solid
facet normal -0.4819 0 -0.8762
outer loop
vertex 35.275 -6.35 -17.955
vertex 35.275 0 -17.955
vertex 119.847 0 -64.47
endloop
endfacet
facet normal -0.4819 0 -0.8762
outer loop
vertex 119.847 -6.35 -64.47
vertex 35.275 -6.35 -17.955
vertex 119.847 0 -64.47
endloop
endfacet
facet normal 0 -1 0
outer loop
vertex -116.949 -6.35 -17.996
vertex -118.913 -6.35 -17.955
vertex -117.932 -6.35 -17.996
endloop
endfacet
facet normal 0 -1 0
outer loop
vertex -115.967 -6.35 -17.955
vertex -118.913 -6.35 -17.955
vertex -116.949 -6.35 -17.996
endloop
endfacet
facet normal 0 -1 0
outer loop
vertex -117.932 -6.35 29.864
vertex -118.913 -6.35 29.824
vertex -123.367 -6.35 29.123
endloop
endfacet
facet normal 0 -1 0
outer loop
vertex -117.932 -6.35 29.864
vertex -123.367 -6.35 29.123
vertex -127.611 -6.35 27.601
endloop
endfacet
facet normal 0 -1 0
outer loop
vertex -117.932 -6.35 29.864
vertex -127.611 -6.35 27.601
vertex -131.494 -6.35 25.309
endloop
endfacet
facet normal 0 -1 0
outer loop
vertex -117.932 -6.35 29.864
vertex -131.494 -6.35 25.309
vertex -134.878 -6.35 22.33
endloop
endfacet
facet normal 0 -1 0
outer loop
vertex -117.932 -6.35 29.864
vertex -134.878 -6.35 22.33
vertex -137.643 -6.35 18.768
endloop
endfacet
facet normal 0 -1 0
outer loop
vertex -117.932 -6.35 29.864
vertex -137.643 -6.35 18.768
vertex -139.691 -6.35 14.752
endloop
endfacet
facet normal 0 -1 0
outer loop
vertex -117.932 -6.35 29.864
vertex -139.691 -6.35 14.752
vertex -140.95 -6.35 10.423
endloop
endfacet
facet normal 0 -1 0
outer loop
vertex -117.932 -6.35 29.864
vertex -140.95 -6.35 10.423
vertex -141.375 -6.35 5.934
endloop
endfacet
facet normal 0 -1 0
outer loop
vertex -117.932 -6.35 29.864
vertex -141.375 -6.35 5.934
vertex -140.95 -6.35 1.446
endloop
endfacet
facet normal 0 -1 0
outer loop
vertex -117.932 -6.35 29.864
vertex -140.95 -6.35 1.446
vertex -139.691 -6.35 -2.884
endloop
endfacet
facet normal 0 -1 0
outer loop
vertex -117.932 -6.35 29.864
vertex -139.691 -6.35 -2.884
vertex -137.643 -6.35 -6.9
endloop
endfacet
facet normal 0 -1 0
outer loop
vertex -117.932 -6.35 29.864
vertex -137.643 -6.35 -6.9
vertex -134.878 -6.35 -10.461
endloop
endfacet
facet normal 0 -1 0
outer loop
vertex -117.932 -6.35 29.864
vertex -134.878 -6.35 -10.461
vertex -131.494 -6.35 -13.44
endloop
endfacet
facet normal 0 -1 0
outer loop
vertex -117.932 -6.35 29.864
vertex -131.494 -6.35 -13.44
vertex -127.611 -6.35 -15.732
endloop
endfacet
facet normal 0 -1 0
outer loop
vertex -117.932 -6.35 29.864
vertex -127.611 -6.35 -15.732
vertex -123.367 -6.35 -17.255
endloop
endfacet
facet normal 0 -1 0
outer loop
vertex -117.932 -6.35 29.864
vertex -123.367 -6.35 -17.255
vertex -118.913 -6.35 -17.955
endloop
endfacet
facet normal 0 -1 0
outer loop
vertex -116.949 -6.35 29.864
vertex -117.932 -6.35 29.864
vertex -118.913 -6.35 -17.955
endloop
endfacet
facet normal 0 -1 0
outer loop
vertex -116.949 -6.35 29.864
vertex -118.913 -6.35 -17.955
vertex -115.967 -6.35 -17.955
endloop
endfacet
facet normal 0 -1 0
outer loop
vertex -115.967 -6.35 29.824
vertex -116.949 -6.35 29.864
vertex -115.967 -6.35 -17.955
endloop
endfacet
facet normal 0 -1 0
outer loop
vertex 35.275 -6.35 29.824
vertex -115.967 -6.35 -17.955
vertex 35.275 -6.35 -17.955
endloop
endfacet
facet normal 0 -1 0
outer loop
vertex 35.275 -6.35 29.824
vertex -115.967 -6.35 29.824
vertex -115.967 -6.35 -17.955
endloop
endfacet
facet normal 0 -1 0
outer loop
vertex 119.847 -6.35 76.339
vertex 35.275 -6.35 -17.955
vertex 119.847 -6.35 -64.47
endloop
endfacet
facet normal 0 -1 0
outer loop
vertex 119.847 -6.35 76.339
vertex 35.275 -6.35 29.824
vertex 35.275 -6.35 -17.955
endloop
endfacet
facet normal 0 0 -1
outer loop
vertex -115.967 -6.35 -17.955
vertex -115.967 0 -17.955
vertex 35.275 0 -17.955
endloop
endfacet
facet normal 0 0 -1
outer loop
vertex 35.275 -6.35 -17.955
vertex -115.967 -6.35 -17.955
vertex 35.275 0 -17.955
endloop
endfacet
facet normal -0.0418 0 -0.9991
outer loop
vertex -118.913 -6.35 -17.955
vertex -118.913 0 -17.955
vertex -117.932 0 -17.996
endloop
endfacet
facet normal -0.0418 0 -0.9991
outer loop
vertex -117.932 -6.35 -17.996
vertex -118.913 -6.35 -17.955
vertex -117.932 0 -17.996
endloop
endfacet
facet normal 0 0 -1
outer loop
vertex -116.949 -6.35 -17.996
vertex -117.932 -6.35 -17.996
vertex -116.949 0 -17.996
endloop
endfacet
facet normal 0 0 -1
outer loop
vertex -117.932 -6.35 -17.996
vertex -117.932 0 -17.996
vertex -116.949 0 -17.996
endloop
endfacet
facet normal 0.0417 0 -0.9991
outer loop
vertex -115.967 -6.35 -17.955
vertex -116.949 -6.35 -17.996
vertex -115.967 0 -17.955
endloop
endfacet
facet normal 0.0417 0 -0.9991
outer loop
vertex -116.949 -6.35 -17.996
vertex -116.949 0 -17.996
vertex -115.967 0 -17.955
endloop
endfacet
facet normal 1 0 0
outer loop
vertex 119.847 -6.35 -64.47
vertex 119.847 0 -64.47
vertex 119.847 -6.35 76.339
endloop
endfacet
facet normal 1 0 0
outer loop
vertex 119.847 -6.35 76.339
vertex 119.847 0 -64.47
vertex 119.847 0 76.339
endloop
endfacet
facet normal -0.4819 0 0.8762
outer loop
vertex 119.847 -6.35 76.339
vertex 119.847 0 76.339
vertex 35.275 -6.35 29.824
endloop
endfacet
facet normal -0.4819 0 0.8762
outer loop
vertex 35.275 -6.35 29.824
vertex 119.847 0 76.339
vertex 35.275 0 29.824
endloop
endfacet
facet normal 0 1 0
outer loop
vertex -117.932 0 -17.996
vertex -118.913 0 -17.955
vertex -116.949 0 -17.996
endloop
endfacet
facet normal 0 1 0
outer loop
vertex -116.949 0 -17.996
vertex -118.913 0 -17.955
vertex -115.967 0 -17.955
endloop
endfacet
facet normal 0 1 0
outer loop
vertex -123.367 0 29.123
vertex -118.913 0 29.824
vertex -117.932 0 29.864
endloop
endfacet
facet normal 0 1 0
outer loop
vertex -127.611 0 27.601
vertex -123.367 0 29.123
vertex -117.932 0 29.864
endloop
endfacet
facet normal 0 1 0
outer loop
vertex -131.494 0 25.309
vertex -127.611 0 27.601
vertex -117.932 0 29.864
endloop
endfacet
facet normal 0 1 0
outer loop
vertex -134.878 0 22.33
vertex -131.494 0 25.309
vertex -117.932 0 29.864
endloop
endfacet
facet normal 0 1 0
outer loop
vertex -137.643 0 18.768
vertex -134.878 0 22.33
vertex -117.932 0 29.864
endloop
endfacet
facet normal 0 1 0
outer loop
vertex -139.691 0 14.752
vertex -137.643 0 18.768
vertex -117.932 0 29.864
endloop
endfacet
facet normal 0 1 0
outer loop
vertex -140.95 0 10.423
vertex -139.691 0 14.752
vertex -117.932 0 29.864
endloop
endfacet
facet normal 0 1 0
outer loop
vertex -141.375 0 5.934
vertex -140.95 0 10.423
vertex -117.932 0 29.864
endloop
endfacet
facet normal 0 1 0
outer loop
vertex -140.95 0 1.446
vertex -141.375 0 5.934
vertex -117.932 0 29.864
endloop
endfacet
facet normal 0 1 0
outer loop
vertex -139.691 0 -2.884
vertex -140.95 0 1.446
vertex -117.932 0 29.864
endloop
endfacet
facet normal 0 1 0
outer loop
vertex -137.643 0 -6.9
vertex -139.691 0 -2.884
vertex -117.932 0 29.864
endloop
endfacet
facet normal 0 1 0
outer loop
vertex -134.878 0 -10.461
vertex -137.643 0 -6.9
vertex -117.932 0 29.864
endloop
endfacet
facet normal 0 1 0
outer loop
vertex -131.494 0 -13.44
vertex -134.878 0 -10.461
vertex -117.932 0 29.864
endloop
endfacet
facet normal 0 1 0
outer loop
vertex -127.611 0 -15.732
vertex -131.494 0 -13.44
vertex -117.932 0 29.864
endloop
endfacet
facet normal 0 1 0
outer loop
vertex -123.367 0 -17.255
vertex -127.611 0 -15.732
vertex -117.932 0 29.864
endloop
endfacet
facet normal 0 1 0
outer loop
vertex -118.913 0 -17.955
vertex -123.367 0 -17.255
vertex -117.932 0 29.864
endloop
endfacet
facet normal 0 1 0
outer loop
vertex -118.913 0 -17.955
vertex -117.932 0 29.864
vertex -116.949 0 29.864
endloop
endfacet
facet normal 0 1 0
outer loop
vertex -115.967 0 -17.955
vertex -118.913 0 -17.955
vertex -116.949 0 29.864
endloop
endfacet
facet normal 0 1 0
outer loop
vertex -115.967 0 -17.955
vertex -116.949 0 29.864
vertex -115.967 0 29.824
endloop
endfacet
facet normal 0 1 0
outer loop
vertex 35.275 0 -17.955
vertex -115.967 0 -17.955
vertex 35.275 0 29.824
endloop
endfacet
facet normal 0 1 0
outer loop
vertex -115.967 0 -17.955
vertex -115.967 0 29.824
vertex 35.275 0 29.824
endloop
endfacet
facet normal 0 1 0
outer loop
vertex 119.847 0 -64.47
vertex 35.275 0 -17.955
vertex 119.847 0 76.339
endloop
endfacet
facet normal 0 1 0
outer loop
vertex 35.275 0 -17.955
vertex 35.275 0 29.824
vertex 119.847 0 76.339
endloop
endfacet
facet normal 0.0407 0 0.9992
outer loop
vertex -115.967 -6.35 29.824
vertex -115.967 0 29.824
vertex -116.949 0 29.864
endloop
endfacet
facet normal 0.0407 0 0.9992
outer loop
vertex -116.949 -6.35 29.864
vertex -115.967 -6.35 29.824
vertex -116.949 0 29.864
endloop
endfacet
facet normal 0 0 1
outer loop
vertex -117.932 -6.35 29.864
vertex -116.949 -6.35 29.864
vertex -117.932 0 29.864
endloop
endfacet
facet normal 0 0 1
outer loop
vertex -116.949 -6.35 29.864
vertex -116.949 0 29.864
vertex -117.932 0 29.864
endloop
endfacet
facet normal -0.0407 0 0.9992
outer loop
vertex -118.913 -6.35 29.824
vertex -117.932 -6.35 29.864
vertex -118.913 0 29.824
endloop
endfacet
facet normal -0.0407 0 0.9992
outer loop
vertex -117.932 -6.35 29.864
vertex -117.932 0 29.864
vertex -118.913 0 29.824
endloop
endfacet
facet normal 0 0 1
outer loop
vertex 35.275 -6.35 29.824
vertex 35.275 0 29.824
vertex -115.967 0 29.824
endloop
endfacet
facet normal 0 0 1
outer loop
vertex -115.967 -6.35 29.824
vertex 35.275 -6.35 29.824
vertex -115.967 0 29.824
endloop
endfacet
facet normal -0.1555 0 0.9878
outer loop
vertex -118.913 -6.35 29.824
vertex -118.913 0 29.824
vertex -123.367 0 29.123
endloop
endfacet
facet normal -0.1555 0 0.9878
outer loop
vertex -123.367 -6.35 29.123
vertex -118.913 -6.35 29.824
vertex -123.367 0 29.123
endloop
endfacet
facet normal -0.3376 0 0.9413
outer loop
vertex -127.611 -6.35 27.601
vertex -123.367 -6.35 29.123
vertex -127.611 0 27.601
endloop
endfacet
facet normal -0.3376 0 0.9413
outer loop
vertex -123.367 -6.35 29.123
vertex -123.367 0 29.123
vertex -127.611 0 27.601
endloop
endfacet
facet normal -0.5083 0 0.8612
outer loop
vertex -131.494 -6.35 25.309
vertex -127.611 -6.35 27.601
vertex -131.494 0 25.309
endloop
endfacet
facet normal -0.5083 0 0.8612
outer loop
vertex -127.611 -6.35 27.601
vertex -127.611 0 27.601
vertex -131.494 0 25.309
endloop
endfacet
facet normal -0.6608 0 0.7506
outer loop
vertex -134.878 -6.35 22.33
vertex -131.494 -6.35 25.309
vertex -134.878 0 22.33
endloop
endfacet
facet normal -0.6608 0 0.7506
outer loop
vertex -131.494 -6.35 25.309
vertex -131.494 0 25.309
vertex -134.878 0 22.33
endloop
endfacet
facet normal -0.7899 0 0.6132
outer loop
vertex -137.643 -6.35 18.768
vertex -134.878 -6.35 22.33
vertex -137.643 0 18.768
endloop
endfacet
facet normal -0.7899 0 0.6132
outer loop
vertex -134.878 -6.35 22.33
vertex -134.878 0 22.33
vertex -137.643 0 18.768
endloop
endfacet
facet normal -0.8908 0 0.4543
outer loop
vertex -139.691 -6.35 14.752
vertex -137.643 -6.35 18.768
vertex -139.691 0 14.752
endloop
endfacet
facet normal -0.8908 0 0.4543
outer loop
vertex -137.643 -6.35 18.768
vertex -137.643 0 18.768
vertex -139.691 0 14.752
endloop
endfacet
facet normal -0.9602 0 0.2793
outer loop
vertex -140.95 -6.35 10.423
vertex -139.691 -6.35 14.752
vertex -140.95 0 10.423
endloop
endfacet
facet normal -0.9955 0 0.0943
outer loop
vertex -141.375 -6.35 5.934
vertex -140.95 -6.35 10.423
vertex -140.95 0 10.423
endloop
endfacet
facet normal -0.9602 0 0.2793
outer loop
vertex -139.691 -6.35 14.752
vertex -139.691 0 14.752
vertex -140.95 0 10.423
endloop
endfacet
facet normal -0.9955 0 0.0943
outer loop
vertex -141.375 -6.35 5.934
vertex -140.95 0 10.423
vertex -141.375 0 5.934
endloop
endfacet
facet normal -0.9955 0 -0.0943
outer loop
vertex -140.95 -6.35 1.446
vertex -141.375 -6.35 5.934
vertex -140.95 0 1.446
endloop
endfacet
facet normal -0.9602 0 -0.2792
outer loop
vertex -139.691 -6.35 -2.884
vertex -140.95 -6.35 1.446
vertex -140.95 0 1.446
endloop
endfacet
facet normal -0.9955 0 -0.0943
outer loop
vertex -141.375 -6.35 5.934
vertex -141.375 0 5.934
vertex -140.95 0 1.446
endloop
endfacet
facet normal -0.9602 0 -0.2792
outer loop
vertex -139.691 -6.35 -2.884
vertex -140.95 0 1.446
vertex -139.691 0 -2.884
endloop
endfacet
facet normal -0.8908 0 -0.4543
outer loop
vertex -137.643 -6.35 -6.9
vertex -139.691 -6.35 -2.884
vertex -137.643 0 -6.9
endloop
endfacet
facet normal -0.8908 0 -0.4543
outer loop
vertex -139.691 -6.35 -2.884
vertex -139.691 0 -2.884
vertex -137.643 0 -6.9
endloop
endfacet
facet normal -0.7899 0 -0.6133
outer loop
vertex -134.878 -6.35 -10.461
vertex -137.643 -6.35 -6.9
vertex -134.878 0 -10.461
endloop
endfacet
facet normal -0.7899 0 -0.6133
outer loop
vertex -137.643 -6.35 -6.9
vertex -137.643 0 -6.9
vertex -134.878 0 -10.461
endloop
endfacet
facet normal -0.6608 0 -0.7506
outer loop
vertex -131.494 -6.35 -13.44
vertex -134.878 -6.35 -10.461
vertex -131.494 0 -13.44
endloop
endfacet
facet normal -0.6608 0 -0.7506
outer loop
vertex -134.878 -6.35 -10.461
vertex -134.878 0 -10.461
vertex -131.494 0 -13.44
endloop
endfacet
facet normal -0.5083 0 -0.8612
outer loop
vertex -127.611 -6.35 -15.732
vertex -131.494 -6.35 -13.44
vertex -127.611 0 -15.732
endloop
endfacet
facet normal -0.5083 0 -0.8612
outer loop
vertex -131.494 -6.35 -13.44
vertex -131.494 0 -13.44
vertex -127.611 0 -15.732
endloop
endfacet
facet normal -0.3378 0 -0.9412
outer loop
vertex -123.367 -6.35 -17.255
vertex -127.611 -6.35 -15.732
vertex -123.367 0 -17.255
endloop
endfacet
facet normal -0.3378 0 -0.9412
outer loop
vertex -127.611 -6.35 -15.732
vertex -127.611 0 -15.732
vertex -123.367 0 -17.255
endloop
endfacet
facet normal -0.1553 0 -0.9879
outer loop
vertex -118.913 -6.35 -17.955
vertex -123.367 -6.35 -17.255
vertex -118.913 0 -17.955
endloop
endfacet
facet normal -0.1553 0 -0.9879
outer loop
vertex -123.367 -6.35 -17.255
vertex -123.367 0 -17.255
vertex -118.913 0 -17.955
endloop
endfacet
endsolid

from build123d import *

# Parameters (mm, degrees)
F1_DEPTH = 6.35


with BuildPart() as f1:
    # F0 (on Front) → F1 (new body)
    with BuildSketch(Plane.XZ):
        with BuildLine():
            Line((-118.913364, 29.823589), (-115.967032, 29.823589))
            ThreePointArc((-115.967032, 29.823589), (-117.440198, 29.868968), (-118.913364, 29.823589))
        make_face()
        with BuildLine():
            Line((35.274541, 29.823589), (-115.967032, 29.823589))
            Line((-115.967032, 29.823589), (-118.913364, 29.823589))
            ThreePointArc((-118.913364, 29.823589), (-141.375006, 5.93416), (-118.913364, -17.955268))
            Line((-118.913364, -17.955268), (-115.967032, -17.955268))
            Line((-115.967032, -17.955268), (35.274541, -17.955268))
            Line((35.274541, -17.955268), (119.84679, -64.470268))
            Line((119.84679, -64.470268), (119.84679, 76.338588))
            Line((119.84679, 76.338588), (35.274541, 29.823589))
        make_face()
        with BuildLine():
            Line((-115.967032, -17.955268), (-118.913364, -17.955268))
            ThreePointArc((-118.913364, -17.955268), (-117.440198, -18.000648), (-115.967032, -17.955268))
        make_face()
    extrude(amount=F1_DEPTH)


solid = f1.part
